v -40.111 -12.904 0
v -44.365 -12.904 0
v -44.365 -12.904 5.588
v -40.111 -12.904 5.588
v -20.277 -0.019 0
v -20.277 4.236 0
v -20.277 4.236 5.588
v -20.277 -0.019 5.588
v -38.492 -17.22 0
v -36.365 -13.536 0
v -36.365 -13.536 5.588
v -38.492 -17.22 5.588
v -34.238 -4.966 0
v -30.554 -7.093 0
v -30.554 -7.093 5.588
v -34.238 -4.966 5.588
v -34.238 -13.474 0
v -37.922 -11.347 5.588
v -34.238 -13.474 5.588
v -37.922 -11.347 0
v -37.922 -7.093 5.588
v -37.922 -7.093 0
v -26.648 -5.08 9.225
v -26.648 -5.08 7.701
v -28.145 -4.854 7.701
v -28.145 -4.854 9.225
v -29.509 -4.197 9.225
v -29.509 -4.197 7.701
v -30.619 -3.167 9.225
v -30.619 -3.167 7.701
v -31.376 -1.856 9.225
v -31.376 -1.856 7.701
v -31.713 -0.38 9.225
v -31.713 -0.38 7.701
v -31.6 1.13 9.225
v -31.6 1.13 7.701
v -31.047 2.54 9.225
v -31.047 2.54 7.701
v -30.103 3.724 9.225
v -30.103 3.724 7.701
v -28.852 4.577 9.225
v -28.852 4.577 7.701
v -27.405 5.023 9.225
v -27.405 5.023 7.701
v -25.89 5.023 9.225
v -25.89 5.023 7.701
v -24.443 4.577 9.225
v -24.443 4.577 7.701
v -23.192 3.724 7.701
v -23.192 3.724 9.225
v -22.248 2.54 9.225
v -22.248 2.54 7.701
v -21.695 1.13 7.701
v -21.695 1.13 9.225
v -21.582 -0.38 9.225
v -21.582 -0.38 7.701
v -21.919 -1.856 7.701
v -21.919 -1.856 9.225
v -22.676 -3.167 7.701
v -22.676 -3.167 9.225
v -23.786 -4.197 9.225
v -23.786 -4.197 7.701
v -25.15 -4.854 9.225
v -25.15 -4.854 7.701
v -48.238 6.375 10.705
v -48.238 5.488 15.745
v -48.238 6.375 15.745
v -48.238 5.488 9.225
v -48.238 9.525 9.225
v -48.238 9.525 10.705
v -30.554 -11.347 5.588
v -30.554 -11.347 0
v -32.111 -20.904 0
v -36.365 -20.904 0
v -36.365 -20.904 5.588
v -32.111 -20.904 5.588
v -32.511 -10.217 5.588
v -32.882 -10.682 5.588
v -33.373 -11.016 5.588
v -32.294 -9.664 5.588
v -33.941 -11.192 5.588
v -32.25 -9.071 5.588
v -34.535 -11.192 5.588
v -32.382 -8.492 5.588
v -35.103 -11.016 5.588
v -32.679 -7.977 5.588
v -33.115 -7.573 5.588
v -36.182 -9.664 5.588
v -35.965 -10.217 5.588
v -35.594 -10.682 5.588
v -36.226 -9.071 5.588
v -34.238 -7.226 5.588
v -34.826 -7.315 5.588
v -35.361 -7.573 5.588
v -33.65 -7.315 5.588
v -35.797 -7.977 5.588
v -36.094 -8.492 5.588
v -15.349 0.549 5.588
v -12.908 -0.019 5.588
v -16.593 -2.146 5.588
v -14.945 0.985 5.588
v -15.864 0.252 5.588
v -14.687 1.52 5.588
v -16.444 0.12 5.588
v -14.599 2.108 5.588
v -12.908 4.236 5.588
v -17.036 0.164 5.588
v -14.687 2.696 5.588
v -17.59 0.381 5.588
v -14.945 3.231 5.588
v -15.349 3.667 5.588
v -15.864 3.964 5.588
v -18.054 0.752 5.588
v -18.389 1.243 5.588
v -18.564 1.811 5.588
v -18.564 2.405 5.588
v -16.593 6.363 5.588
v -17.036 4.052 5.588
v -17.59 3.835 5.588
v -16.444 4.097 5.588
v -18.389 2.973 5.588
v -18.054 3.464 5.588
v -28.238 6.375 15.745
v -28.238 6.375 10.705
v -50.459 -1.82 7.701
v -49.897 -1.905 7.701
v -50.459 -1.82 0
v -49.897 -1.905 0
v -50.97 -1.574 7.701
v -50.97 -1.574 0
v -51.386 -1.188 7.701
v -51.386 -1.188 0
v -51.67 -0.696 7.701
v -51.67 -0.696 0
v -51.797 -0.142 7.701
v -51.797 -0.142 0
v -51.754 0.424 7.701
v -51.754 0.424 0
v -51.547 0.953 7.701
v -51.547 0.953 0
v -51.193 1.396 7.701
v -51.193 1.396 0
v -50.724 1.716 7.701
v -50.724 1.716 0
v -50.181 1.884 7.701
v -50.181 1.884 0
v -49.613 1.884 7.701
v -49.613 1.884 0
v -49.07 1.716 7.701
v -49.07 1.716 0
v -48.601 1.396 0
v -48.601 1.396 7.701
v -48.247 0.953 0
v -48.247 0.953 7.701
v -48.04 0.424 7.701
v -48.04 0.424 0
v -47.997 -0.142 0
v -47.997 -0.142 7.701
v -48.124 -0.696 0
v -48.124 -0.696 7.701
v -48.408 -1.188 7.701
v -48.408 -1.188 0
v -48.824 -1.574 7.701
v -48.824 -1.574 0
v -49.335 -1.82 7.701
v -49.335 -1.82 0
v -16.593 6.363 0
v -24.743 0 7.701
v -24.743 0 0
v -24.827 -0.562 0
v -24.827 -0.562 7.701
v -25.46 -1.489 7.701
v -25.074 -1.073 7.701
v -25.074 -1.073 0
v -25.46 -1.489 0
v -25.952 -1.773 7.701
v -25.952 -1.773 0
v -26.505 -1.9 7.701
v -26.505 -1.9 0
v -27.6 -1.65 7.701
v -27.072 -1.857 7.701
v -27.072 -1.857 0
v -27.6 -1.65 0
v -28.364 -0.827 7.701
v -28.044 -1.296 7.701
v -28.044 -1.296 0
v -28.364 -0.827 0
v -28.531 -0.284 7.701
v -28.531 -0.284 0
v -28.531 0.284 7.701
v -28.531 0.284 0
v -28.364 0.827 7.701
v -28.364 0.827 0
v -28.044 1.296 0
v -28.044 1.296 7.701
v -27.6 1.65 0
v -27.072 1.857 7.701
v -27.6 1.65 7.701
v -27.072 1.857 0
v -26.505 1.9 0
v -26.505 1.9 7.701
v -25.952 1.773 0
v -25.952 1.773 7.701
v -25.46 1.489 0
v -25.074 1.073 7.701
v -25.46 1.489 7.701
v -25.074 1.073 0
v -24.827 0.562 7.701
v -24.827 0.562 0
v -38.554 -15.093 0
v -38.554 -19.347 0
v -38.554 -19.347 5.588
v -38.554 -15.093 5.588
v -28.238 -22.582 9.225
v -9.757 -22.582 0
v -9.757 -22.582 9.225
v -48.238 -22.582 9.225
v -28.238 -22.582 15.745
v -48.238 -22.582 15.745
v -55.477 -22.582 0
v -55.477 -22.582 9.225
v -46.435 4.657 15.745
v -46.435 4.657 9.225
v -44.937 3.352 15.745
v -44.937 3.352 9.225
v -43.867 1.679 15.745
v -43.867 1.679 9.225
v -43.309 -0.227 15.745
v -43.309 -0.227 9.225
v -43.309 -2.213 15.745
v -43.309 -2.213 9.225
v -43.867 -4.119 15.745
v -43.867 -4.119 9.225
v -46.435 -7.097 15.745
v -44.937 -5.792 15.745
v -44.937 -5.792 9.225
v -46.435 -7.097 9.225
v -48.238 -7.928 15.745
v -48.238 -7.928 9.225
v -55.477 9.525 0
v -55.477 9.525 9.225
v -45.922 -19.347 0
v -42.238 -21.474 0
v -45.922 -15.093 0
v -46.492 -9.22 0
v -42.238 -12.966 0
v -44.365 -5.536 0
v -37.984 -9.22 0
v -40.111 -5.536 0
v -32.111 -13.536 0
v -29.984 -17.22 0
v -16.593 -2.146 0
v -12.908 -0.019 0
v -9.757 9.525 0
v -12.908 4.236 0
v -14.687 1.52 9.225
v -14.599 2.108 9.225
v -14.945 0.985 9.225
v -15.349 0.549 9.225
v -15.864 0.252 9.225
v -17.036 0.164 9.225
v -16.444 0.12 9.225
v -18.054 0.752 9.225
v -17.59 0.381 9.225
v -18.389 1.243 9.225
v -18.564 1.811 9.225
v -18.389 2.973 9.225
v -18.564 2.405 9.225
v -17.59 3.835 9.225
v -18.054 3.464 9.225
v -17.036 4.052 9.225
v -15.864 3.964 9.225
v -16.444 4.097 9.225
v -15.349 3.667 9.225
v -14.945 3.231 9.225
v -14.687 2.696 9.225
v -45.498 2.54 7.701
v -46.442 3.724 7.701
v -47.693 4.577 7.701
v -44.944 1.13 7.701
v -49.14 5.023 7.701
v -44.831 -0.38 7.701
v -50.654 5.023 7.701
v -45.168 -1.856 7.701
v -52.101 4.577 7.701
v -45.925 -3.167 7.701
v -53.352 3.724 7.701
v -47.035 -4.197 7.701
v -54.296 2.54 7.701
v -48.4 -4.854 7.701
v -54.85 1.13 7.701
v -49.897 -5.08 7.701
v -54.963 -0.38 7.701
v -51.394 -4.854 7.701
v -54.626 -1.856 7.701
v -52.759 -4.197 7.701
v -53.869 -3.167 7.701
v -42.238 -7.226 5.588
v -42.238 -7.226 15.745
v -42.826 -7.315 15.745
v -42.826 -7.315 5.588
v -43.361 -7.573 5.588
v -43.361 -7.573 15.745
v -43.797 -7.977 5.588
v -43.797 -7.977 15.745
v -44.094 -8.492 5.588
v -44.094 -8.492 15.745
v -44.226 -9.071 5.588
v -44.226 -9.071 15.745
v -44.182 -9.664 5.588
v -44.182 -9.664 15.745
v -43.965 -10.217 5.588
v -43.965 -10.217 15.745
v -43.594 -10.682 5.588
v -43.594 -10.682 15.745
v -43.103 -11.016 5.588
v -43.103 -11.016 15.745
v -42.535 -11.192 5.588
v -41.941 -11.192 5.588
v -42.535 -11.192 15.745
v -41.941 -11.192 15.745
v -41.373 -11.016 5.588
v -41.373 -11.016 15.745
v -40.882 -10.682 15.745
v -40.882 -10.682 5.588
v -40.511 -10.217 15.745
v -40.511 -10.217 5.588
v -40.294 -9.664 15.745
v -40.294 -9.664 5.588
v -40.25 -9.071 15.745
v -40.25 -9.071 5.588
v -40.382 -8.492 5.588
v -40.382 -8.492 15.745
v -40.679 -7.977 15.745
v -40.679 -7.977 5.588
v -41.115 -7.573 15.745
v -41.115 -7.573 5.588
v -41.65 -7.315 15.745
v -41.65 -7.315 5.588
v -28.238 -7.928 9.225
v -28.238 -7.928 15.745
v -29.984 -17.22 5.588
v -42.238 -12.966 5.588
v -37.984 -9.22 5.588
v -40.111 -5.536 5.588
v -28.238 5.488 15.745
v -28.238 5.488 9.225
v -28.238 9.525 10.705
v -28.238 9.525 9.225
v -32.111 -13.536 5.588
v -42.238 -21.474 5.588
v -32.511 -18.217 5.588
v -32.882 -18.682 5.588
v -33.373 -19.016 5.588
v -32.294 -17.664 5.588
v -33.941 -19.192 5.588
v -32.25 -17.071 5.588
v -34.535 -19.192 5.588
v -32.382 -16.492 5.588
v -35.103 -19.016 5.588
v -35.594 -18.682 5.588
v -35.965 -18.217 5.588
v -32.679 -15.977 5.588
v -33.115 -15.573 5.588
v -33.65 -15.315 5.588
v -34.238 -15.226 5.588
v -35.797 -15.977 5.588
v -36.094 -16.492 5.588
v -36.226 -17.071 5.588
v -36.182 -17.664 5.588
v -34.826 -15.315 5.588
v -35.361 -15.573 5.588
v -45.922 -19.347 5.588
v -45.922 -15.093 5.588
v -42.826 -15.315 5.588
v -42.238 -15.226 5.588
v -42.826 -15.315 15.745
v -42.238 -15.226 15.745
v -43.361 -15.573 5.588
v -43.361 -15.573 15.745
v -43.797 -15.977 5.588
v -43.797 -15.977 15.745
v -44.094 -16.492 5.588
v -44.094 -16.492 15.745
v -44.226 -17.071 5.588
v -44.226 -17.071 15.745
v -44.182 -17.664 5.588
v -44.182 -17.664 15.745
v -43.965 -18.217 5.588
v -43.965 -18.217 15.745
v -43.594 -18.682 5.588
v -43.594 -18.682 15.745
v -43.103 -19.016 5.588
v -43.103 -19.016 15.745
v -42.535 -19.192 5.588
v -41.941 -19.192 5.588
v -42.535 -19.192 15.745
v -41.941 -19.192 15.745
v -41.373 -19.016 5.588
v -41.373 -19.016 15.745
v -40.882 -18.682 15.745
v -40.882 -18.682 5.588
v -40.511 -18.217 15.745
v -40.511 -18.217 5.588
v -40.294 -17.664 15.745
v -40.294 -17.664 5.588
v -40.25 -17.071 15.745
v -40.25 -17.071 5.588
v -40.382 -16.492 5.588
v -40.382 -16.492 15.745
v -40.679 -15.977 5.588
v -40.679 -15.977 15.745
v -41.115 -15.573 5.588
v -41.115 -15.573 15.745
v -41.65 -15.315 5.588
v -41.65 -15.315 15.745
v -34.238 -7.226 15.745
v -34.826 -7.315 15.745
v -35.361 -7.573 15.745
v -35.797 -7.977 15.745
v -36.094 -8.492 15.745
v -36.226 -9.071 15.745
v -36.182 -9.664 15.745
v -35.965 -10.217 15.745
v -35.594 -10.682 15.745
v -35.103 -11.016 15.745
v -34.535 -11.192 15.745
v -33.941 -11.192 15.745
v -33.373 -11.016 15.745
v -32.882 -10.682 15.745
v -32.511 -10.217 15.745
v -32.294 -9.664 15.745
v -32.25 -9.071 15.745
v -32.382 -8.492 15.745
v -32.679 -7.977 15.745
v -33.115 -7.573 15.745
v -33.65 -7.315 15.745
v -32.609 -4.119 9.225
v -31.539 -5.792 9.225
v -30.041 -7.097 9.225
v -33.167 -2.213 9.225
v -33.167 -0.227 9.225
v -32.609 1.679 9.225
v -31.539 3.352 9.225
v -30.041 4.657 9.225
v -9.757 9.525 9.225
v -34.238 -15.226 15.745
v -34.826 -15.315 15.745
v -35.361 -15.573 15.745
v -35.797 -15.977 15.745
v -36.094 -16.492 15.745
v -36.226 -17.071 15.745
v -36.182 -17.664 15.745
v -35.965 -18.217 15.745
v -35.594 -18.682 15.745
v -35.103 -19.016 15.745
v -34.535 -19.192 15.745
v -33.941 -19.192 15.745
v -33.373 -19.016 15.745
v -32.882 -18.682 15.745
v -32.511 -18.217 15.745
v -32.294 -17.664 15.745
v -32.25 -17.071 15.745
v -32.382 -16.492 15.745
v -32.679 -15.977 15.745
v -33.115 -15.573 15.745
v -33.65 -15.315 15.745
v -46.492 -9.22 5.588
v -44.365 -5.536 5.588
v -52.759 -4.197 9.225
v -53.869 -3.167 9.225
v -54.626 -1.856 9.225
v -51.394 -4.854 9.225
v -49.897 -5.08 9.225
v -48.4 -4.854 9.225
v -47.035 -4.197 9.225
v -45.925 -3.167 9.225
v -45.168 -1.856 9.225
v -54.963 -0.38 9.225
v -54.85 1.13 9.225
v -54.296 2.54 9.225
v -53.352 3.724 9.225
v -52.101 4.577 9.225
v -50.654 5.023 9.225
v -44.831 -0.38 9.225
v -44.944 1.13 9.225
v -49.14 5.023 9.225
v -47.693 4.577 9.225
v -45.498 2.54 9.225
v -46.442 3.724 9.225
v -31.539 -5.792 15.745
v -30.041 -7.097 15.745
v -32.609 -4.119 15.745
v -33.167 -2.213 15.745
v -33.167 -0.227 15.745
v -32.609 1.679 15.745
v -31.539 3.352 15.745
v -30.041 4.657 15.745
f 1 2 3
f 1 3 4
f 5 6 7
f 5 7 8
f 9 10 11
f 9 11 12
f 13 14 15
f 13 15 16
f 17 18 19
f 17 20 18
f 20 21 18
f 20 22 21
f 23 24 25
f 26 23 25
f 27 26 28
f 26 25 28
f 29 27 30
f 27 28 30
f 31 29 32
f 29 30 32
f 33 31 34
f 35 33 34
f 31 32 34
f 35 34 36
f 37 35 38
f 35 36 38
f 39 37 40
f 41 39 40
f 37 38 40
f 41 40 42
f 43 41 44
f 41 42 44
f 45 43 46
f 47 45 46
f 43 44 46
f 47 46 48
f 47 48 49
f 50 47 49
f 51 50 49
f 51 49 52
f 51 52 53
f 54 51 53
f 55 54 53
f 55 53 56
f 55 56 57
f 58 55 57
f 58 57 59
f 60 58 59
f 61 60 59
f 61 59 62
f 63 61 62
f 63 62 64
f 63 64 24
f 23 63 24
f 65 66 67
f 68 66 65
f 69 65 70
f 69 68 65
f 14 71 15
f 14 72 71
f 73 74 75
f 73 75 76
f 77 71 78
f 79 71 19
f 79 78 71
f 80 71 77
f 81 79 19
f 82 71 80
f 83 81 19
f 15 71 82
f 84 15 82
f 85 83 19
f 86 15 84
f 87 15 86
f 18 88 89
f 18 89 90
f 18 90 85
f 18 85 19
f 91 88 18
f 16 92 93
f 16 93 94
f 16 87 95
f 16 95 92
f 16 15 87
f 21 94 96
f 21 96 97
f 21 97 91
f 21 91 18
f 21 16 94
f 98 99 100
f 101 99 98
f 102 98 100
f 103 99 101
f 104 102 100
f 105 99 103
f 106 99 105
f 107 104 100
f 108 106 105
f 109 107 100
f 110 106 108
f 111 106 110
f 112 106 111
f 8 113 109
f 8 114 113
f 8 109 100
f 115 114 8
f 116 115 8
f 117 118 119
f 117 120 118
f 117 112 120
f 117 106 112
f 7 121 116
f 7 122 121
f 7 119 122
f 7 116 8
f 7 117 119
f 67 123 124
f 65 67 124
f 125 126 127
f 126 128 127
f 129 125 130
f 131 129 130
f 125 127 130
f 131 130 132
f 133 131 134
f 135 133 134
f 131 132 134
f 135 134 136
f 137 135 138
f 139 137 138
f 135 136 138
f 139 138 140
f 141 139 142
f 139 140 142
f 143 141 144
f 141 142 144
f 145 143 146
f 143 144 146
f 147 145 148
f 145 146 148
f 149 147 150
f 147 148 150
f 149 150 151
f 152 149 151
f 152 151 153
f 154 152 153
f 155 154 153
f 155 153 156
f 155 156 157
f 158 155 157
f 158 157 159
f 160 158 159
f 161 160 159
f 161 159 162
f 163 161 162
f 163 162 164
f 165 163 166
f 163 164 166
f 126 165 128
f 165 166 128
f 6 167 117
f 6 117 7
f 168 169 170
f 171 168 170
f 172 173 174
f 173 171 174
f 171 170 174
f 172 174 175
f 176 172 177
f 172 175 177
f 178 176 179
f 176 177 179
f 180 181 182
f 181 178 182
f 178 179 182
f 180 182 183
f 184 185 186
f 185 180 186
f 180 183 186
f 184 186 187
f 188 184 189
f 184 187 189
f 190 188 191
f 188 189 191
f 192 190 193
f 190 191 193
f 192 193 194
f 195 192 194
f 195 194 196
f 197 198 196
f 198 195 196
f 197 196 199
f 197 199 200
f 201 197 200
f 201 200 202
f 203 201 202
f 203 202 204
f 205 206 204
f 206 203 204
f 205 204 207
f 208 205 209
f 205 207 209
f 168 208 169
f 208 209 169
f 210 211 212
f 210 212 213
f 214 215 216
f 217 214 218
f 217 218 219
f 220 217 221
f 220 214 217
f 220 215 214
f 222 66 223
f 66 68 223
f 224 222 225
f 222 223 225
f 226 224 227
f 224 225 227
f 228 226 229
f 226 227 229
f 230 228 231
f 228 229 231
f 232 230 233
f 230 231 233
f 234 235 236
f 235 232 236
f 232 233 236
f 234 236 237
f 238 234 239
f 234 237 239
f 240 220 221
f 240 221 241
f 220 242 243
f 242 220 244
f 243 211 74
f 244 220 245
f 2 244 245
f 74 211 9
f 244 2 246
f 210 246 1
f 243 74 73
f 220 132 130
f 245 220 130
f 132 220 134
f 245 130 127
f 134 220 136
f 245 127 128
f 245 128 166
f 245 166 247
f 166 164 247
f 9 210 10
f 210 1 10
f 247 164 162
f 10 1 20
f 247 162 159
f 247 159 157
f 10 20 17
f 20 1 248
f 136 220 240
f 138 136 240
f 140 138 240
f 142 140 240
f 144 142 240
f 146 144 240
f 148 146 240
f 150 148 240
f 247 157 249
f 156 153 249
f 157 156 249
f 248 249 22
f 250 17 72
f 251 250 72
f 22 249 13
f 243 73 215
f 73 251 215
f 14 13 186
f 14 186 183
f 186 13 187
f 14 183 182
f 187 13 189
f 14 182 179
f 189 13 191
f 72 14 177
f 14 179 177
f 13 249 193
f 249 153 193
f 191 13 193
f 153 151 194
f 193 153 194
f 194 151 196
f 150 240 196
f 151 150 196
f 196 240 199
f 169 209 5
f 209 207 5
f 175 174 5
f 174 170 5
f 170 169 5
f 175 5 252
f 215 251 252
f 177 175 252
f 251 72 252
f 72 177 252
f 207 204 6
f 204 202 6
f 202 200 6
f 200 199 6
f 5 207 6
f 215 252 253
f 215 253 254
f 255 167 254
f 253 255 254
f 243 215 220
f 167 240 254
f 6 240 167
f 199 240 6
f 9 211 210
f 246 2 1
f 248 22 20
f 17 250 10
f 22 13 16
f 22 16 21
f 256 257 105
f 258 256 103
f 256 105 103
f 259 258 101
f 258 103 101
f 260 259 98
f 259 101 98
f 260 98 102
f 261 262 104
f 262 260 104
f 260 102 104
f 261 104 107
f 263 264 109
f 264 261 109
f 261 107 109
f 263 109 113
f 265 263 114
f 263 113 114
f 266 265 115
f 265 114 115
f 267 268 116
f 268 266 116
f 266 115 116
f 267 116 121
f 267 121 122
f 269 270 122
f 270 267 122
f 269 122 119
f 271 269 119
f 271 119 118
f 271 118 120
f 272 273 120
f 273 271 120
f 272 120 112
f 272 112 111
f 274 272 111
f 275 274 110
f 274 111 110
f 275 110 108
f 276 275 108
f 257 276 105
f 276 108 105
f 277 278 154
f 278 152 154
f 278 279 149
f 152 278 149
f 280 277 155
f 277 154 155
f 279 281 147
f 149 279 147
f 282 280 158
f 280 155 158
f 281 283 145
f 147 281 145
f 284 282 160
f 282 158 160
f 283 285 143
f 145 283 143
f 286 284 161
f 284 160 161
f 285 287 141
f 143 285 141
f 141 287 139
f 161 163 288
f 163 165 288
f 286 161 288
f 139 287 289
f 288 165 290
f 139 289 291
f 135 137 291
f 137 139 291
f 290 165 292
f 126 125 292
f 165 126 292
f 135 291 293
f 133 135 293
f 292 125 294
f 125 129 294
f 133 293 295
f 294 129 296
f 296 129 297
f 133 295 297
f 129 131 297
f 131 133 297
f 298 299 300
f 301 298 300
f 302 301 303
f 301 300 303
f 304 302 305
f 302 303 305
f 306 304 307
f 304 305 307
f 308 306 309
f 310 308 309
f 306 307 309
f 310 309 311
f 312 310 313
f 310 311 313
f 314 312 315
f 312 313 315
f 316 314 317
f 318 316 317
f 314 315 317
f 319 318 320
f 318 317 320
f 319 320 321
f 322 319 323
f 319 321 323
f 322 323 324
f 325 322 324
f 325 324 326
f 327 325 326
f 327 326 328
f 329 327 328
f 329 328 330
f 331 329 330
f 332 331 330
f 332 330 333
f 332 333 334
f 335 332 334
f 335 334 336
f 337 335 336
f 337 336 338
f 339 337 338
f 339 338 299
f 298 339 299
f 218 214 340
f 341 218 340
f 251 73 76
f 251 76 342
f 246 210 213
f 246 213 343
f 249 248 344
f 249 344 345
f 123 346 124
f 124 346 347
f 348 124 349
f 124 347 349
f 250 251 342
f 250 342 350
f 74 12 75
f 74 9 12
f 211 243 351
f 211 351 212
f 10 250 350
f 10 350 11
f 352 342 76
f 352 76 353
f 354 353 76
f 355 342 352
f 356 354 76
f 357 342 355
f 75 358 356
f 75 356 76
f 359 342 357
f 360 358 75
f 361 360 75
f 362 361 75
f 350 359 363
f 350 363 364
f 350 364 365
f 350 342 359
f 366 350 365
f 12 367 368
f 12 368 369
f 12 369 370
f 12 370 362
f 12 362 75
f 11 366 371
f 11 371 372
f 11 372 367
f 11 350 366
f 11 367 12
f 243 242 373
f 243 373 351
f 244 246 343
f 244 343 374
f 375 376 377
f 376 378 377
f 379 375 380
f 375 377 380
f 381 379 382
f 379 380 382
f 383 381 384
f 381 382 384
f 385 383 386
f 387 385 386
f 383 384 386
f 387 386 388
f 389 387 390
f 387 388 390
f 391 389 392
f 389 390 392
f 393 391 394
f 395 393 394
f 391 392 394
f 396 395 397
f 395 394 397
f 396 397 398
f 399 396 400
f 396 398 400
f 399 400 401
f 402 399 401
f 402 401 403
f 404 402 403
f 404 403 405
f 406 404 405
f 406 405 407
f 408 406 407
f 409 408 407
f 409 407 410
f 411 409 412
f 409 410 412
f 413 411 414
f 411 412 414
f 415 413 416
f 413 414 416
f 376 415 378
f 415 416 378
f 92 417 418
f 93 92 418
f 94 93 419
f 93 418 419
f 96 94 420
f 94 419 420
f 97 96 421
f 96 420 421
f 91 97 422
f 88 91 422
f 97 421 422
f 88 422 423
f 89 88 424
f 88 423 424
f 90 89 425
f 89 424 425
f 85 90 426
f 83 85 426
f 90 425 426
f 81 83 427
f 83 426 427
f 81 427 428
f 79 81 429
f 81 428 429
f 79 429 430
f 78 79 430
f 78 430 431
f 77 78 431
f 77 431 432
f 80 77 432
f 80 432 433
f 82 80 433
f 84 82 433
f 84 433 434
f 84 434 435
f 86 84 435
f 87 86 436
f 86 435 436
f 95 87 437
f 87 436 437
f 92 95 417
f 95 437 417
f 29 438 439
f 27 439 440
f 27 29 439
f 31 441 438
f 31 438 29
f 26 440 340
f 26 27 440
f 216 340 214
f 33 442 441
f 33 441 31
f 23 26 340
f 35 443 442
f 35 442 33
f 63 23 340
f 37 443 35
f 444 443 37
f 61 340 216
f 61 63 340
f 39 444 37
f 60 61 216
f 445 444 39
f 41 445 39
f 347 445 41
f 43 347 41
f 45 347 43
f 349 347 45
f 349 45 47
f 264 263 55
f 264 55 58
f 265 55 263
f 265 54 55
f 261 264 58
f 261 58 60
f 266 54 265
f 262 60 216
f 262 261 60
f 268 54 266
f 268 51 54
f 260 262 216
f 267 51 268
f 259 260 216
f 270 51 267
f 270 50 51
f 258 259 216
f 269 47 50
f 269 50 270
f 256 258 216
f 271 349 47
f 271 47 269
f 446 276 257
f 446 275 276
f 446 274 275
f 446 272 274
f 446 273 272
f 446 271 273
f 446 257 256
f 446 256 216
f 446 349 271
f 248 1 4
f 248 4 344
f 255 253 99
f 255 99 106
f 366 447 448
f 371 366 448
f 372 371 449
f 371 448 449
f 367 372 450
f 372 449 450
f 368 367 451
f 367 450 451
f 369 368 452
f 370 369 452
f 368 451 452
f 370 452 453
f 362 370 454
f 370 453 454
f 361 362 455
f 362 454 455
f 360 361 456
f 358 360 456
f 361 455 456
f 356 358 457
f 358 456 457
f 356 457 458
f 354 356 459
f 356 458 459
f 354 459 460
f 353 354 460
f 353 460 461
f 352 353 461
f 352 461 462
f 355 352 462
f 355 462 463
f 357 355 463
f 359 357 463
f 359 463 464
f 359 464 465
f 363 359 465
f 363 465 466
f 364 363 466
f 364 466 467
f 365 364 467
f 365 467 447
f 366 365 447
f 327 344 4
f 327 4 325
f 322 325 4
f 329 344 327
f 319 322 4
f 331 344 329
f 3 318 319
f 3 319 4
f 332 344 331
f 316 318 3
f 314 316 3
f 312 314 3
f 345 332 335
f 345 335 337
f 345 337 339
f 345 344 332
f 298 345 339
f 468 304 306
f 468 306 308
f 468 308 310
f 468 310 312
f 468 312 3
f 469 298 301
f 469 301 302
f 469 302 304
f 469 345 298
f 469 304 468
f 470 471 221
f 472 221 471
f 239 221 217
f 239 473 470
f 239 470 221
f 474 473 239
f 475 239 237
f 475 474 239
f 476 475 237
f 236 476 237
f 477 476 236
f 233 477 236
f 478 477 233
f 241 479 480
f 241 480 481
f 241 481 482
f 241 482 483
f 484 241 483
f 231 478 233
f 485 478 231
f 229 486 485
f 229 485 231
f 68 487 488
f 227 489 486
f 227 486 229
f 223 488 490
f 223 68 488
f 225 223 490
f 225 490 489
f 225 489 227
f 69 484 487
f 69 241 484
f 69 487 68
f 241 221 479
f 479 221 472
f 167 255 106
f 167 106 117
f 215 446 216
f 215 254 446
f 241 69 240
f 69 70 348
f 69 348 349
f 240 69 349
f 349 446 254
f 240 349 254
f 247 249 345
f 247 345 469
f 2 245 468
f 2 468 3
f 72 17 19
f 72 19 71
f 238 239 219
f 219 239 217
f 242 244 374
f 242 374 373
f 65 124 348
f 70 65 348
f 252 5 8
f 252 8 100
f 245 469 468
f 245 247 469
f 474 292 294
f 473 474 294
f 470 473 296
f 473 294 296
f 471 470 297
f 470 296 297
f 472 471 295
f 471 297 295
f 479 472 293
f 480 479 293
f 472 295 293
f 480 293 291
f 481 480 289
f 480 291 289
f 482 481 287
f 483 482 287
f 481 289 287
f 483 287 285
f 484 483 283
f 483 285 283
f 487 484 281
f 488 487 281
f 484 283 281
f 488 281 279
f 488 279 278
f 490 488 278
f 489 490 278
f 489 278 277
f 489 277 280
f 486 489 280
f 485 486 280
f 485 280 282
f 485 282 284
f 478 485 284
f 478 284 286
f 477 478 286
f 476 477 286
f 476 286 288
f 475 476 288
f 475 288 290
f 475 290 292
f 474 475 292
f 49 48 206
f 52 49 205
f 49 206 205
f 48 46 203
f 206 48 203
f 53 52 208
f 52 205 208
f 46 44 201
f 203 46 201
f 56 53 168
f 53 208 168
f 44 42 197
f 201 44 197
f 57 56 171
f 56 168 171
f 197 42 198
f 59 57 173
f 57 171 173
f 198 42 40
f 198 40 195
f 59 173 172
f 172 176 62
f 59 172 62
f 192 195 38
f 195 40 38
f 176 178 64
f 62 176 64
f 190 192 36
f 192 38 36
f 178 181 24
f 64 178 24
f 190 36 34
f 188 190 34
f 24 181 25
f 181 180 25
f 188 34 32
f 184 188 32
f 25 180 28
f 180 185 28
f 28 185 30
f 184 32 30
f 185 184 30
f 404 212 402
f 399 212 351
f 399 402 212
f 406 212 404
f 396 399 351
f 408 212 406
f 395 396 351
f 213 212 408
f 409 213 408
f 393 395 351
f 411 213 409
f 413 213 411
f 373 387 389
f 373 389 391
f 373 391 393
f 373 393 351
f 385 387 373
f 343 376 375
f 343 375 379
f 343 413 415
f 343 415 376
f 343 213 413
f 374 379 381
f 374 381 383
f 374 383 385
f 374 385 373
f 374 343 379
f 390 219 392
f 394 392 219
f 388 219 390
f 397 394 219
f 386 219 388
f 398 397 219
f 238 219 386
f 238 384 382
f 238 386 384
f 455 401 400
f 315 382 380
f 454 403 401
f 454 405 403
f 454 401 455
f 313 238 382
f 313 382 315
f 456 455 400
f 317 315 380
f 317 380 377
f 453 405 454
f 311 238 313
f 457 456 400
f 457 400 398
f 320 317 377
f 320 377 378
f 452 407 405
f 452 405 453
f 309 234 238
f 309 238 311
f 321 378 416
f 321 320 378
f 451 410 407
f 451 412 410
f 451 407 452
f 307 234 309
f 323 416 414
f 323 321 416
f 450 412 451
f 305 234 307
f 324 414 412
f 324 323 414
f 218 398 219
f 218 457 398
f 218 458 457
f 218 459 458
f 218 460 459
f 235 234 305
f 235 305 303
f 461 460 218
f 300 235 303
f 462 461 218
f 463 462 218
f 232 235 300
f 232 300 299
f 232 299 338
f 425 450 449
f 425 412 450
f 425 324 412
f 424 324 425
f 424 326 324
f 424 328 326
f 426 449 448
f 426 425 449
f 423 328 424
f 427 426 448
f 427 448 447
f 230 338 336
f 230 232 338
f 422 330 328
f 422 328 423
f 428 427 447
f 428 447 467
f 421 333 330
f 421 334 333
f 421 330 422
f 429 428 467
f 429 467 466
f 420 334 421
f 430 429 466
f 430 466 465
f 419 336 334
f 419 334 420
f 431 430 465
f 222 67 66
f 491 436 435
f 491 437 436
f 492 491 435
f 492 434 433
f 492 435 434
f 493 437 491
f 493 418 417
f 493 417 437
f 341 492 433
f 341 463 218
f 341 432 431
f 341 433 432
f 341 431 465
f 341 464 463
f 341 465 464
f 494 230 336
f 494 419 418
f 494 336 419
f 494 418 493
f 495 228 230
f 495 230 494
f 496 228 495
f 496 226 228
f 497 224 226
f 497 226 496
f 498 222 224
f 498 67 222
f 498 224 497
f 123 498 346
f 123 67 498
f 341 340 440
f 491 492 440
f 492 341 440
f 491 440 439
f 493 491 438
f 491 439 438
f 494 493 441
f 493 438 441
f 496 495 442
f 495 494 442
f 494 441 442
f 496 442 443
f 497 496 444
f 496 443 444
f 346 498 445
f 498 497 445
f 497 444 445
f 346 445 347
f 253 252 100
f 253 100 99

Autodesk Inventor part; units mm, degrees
ref_plane "Work Plane5" through (0, 0, 0) normal (0, 0, 1) x (1, 0, 0)
sketch "Sketch1" plane through (0, 0, 0) normal (0, 0, 1) x (1, 0, 0)
  line L0 (-46.1271, -22.5825) -> (-26.1271, -22.5825) construction
  line L1 (-9.7566, 12.6962) -> (-9.7566, -12.6962) construction
  line L2 (-26.1271, 20.28) -> (-46.1271, 20.28) construction
  circle A0 centre (-49.897, 0) radius 1.778
  arc A1 (-26.7903, 1.7468) -> (-25.506, 1.3298) centre (-26.6476, 0) ccw construction
  circle A2 centre (-49.897, 0) radius 1.905
  circle A3 centre (-26.6476, 0) radius 1.905
  line L3 (-52.9366, 6.2882) -> (-52.9366, -15.9368)
  line L4 (-55.4766, 6.2882) -> (-55.4766, -15.9368) construction
  line L5 (-9.7566, -22.5825) -> (-55.4766, -22.5825)
  line L6 (-55.4766, -22.5825) -> (-55.4766, 20.28)
  line L7 (-55.4766, 20.28) -> (-9.7566, 20.28)
  line L8 (-9.7566, 20.28) -> (-9.7566, -22.5825)
  circle A4 centre (-16.5926, 2.1082) radius 2.15 construction
  circle A5 centre (-16.5926, 2.1082) radius 1.9939
  point P0 (0, 0)
  dimension "d0" = 3.81
  dimension "d1" = 3.81
  dimension "d2" = 2.54
  dimension "d3" = 3.9878
ref_plane "Work Plane2" through (-20.9694, -2.2685, 9.225) normal (0, 0, -1) x (0.1078, 0.9942, 0)
extrude "Extrusion1" add sketch "Sketch1" along normal up to surface (9.225 mm away) contours A2 | L5 L6 L7 L8
ref_plane "Work Plane3" through (-49.3551, -24.0887, 15.745) normal (0, 0, -1) x (0, 1, 0)
ref_plane "Work Plane7" through (-55.4766, -22.5825, 9.225) normal (0, 0, 1) x (1, 0, 0)
sketch "Sketch3" plane through (-55.4766, -22.5825, 9.225) normal (0, 0, 1) x (1, 0, 0)
  line L0 (27.2386, 42.8625) -> (7.2386, 42.8625) projected
  arc A0 (27.2386, 28.0707) -> (27.2386, 14.6543) centre (29.2386, 21.3625) ccw projected
  line L1 (27.2386, 0) -> (27.2386, 14.6543) projected
  line L2 (7.2386, 14.6543) -> (7.2386, 0) projected
  line L3 (7.2386, 0) -> (27.2386, 0) projected
  arc A1 (7.2386, 14.6543) -> (7.2386, 28.0707) centre (5.2386, 21.3625) ccw projected
  line L4 (7.2386, 28.0707) -> (7.2386, 42.8625)
  line L5 (0, 42.8625) -> (45.72, 42.8625) projected
  line L6 (27.2386, 28.0707) -> (27.2386, 42.8625)
  point P0 (55.4766, 22.5825)
ref_plane "Work Plane4" through (-51.466, -24.0887, 15.745) normal (0, 0, -1) x (0, 1, 0)
extrude "Extrusion3" add sketch "Sketch3" along normal up to surface (6.52 mm away)
ref_plane "Work Plane9" through (-55.4766, -22.5825, 9.225) normal (0, 0, 1) x (1, 0, 0)
sketch "Sketch4" plane through (-55.4766, -22.5825, 9.225) normal (0, 0, 1) x (1, 0, 0)
  circle A0 centre (5.5796, 22.5825) radius 1.778 projected
  circle A1 centre (5.5796, 22.5825) radius 1.905
  line L0 (7.2386, 28.0707) -> (7.2386, 42.8625) projected
  line L1 (7.2386, 42.8625) -> (0, 42.8625) projected
  line L2 (0, 42.8625) -> (0, 0) projected
  line L3 (0, 0) -> (7.2386, 0) projected
  line L4 (7.2386, 0) -> (7.2386, 14.6543) projected
  arc A2 (7.2386, 14.6543) -> (7.2386, 28.0707) centre (5.2386, 21.3625) ccw projected
  circle A3 centre (5.5796, 22.5825) radius 1.778 projected
  circle A4 centre (28.829, 22.5825) radius 1.9812 projected
  point P0 (55.4766, 22.5825)
  dimension "d18" = 3.81
hole "Hole1" at (-49.897, 0, 9.225) at (-26.6476, 0, 9.225) direction (0, 0, -1) diameter 3.81 end through all counterbore diameter 10.16 counterbore depth 1.524
ref_plane "Work Plane8" through (-9.7566, -22.5825, 0) normal (1, 0, 0) x (0, 0, -1)
sketch "Sketch6" plane through (-9.7566, -22.5825, 0) normal (1, 0, 0) x (0, 0, -1)
  line L0 (-11.975, 30.2275) -> (-14.475, 30.2275) construction
  line L1 (-11.975, 39.7275) -> (-11.975, 30.2275) construction
  line L2 (31.025, 39.7275) -> (-11.975, 39.7275) construction
  line L3 (31.025, 38.4575) -> (-10.705, 38.4575) construction
  line L4 (-10.705, 32.1075) -> (-10.705, 28.9575) construction
  line L5 (-10.705, 28.9575) -> (-14.475, 28.9575) construction
  line L6 (-10.705, 28.9575) -> (-10.705, 32.1075)
  line L7 (0, 42.8625) -> (0, 0) projected
  line L8 (0, 32.1075) -> (0, 42.8625)
  line L9 (0, 42.8625) -> (-15.745, 42.8625)
  line L10 (-15.745, 42.8625) -> (-15.745, 28.9575)
  line L11 (-15.745, 28.9575) -> (-10.705, 28.9575)
  line L12 (3.1182, 32.1075) -> (5.3958, 32.1075) construction
  line L13 (-10.705, 32.1075) -> (0, 32.1075)
  point P0 (0, 22.5825)
  point P1 (0, 38.4575)
  dimension "d28" = 1.27
extrude "Extrusion4" cut sketch "Sketch6" against normal through all
sketch "Sketch7" plane through (-48.238, -22.5825, 15.745) normal (0, 0, 1) x (1, 0, 0)
  circle A0 centre (6, 5.3625) radius 2 construction
  circle A1 centre (14, 5.3625) radius 2 construction
  arc A2 (7.4142, 14.7767) -> (4.5858, 11.9483) centre (6, 13.3625) ccw construction
  arc A3 (15.4142, 11.9483) -> (12.5858, 14.7767) centre (14, 13.3625) ccw construction
  point P0 (48.238, 22.5825)
sketch "Sketch9" plane through (0, 0, 0) normal (0, 0, -1) x (-1, 0, 0)
  arc A0 (43.6522, -10.6342) -> (40.8238, -7.8058) centre (42.238, -9.22) ccw construction
  arc A1 (35.6522, -7.8058) -> (32.8238, -10.6342) centre (34.238, -9.22) ccw construction
  circle A2 centre (42.238, -17.22) radius 2 construction
  circle A3 centre (34.238, -17.22) radius 2 construction
  point P0 (0, 0)
hole "Hole2" at (-34.238, -9.22, 0) at (-42.238, -9.22, 0) at (-42.238, -17.22, 0) at (-34.238, -17.22, 0) direction (0, 0, 1) diameter 3.9878 end through all
ref_plane "Work Plane6" through (0, 0, 0) normal (0, 0, -1) x (-1, 0, 0)
sketch "Sketch10" plane through (0, 0, 0) normal (0, 0, -1) x (-1, 0, 0)
  circle A0 centre (34.238, -9.22) radius 1.9939 construction
  circle A1 centre (42.238, -9.22) radius 1.9939 construction
  circle A2 centre (42.238, -17.22) radius 1.9939 construction
  circle A3 centre (34.238, -17.22) radius 1.9939 construction
  circle A4 centre (34.238, -9.22) radius 4.2545 construction
  circle A5 centre (42.238, -9.22) radius 4.2545 construction
  line L0 (34.238, -13.4745) -> (30.5535, -11.3472)
  line L1 (30.5535, -11.3472) -> (30.5535, -7.0927)
  line L2 (30.5535, -7.0927) -> (34.238, -4.9655)
  line L3 (34.238, -4.9655) -> (37.9225, -7.0927)
  line L4 (37.9225, -7.0927) -> (37.9225, -11.3472)
  line L5 (37.9225, -11.3472) -> (34.238, -13.4745)
  circle A6 centre (34.238, -17.22) radius 4.2545 construction
  circle A7 centre (42.238, -17.22) radius 4.2545 construction
  line L6 (38.4925, -17.22) -> (36.3652, -20.9045)
  line L7 (36.3652, -20.9045) -> (32.1107, -20.9045)
  line L8 (32.1107, -20.9045) -> (29.9835, -17.22)
  line L9 (29.9835, -17.22) -> (32.1107, -13.5355)
  line L10 (32.1107, -13.5355) -> (36.3652, -13.5355)
  line L11 (36.3652, -13.5355) -> (38.4925, -17.22)
  line L12 (42.238, -21.4745) -> (38.5535, -19.3472)
  line L13 (38.5535, -19.3472) -> (38.5535, -15.0927)
  line L14 (38.5535, -15.0927) -> (42.238, -12.9655)
  line L15 (42.238, -12.9655) -> (45.9225, -15.0927)
  line L16 (45.9225, -15.0927) -> (45.9225, -19.3472)
  line L17 (45.9225, -19.3472) -> (42.238, -21.4745)
  line L18 (46.4925, -9.22) -> (44.3652, -12.9045)
  line L19 (44.3652, -12.9045) -> (40.1107, -12.9045)
  line L20 (40.1107, -12.9045) -> (37.9835, -9.22)
  line L21 (37.9835, -9.22) -> (40.1107, -5.5355)
  line L22 (40.1107, -5.5355) -> (44.3652, -5.5355)
  line L23 (44.3652, -5.5355) -> (46.4925, -9.22)
  circle A8 centre (16.5926, 2.1082) radius 1.9939 construction
  circle A9 centre (16.5926, 2.1082) radius 4.2545 construction
  line L24 (16.5926, -2.1463) -> (12.9081, -0.019)
  line L25 (12.9081, -0.019) -> (12.9081, 4.2355)
  line L26 (12.9081, 4.2355) -> (16.5926, 6.3627)
  line L27 (16.5926, 6.3627) -> (20.2771, 4.2355)
  line L28 (20.2771, 4.2355) -> (20.2771, -0.019)
  line L29 (20.2771, -0.019) -> (16.5926, -2.1463)
  point P0 (0, 0)
  point P1 (42.238, -13.4745)
  dimension "d38" = 8.509
  dimension "d44" = 8.509
  dimension "d45" = 8.509
  dimension "d48" = 8.509
  dimension "d39" = 8.509
extrude "Extrusion6" cut sketch "Sketch10" against normal blind 5.588 contours L0 L1 L2 L3 L4 L5 | L6 L7 L8 L9 L10 L11 | L12 L13 L14 L15 L16 L17 | L18 L19 L20 L21 L22 L23
extrude "Extrusion7" cut sketch "Sketch10" against normal blind 5.588 contours L24 L25 L26 L27 L28 L29
properties part number "CollectorArmRollerSupportRight"
